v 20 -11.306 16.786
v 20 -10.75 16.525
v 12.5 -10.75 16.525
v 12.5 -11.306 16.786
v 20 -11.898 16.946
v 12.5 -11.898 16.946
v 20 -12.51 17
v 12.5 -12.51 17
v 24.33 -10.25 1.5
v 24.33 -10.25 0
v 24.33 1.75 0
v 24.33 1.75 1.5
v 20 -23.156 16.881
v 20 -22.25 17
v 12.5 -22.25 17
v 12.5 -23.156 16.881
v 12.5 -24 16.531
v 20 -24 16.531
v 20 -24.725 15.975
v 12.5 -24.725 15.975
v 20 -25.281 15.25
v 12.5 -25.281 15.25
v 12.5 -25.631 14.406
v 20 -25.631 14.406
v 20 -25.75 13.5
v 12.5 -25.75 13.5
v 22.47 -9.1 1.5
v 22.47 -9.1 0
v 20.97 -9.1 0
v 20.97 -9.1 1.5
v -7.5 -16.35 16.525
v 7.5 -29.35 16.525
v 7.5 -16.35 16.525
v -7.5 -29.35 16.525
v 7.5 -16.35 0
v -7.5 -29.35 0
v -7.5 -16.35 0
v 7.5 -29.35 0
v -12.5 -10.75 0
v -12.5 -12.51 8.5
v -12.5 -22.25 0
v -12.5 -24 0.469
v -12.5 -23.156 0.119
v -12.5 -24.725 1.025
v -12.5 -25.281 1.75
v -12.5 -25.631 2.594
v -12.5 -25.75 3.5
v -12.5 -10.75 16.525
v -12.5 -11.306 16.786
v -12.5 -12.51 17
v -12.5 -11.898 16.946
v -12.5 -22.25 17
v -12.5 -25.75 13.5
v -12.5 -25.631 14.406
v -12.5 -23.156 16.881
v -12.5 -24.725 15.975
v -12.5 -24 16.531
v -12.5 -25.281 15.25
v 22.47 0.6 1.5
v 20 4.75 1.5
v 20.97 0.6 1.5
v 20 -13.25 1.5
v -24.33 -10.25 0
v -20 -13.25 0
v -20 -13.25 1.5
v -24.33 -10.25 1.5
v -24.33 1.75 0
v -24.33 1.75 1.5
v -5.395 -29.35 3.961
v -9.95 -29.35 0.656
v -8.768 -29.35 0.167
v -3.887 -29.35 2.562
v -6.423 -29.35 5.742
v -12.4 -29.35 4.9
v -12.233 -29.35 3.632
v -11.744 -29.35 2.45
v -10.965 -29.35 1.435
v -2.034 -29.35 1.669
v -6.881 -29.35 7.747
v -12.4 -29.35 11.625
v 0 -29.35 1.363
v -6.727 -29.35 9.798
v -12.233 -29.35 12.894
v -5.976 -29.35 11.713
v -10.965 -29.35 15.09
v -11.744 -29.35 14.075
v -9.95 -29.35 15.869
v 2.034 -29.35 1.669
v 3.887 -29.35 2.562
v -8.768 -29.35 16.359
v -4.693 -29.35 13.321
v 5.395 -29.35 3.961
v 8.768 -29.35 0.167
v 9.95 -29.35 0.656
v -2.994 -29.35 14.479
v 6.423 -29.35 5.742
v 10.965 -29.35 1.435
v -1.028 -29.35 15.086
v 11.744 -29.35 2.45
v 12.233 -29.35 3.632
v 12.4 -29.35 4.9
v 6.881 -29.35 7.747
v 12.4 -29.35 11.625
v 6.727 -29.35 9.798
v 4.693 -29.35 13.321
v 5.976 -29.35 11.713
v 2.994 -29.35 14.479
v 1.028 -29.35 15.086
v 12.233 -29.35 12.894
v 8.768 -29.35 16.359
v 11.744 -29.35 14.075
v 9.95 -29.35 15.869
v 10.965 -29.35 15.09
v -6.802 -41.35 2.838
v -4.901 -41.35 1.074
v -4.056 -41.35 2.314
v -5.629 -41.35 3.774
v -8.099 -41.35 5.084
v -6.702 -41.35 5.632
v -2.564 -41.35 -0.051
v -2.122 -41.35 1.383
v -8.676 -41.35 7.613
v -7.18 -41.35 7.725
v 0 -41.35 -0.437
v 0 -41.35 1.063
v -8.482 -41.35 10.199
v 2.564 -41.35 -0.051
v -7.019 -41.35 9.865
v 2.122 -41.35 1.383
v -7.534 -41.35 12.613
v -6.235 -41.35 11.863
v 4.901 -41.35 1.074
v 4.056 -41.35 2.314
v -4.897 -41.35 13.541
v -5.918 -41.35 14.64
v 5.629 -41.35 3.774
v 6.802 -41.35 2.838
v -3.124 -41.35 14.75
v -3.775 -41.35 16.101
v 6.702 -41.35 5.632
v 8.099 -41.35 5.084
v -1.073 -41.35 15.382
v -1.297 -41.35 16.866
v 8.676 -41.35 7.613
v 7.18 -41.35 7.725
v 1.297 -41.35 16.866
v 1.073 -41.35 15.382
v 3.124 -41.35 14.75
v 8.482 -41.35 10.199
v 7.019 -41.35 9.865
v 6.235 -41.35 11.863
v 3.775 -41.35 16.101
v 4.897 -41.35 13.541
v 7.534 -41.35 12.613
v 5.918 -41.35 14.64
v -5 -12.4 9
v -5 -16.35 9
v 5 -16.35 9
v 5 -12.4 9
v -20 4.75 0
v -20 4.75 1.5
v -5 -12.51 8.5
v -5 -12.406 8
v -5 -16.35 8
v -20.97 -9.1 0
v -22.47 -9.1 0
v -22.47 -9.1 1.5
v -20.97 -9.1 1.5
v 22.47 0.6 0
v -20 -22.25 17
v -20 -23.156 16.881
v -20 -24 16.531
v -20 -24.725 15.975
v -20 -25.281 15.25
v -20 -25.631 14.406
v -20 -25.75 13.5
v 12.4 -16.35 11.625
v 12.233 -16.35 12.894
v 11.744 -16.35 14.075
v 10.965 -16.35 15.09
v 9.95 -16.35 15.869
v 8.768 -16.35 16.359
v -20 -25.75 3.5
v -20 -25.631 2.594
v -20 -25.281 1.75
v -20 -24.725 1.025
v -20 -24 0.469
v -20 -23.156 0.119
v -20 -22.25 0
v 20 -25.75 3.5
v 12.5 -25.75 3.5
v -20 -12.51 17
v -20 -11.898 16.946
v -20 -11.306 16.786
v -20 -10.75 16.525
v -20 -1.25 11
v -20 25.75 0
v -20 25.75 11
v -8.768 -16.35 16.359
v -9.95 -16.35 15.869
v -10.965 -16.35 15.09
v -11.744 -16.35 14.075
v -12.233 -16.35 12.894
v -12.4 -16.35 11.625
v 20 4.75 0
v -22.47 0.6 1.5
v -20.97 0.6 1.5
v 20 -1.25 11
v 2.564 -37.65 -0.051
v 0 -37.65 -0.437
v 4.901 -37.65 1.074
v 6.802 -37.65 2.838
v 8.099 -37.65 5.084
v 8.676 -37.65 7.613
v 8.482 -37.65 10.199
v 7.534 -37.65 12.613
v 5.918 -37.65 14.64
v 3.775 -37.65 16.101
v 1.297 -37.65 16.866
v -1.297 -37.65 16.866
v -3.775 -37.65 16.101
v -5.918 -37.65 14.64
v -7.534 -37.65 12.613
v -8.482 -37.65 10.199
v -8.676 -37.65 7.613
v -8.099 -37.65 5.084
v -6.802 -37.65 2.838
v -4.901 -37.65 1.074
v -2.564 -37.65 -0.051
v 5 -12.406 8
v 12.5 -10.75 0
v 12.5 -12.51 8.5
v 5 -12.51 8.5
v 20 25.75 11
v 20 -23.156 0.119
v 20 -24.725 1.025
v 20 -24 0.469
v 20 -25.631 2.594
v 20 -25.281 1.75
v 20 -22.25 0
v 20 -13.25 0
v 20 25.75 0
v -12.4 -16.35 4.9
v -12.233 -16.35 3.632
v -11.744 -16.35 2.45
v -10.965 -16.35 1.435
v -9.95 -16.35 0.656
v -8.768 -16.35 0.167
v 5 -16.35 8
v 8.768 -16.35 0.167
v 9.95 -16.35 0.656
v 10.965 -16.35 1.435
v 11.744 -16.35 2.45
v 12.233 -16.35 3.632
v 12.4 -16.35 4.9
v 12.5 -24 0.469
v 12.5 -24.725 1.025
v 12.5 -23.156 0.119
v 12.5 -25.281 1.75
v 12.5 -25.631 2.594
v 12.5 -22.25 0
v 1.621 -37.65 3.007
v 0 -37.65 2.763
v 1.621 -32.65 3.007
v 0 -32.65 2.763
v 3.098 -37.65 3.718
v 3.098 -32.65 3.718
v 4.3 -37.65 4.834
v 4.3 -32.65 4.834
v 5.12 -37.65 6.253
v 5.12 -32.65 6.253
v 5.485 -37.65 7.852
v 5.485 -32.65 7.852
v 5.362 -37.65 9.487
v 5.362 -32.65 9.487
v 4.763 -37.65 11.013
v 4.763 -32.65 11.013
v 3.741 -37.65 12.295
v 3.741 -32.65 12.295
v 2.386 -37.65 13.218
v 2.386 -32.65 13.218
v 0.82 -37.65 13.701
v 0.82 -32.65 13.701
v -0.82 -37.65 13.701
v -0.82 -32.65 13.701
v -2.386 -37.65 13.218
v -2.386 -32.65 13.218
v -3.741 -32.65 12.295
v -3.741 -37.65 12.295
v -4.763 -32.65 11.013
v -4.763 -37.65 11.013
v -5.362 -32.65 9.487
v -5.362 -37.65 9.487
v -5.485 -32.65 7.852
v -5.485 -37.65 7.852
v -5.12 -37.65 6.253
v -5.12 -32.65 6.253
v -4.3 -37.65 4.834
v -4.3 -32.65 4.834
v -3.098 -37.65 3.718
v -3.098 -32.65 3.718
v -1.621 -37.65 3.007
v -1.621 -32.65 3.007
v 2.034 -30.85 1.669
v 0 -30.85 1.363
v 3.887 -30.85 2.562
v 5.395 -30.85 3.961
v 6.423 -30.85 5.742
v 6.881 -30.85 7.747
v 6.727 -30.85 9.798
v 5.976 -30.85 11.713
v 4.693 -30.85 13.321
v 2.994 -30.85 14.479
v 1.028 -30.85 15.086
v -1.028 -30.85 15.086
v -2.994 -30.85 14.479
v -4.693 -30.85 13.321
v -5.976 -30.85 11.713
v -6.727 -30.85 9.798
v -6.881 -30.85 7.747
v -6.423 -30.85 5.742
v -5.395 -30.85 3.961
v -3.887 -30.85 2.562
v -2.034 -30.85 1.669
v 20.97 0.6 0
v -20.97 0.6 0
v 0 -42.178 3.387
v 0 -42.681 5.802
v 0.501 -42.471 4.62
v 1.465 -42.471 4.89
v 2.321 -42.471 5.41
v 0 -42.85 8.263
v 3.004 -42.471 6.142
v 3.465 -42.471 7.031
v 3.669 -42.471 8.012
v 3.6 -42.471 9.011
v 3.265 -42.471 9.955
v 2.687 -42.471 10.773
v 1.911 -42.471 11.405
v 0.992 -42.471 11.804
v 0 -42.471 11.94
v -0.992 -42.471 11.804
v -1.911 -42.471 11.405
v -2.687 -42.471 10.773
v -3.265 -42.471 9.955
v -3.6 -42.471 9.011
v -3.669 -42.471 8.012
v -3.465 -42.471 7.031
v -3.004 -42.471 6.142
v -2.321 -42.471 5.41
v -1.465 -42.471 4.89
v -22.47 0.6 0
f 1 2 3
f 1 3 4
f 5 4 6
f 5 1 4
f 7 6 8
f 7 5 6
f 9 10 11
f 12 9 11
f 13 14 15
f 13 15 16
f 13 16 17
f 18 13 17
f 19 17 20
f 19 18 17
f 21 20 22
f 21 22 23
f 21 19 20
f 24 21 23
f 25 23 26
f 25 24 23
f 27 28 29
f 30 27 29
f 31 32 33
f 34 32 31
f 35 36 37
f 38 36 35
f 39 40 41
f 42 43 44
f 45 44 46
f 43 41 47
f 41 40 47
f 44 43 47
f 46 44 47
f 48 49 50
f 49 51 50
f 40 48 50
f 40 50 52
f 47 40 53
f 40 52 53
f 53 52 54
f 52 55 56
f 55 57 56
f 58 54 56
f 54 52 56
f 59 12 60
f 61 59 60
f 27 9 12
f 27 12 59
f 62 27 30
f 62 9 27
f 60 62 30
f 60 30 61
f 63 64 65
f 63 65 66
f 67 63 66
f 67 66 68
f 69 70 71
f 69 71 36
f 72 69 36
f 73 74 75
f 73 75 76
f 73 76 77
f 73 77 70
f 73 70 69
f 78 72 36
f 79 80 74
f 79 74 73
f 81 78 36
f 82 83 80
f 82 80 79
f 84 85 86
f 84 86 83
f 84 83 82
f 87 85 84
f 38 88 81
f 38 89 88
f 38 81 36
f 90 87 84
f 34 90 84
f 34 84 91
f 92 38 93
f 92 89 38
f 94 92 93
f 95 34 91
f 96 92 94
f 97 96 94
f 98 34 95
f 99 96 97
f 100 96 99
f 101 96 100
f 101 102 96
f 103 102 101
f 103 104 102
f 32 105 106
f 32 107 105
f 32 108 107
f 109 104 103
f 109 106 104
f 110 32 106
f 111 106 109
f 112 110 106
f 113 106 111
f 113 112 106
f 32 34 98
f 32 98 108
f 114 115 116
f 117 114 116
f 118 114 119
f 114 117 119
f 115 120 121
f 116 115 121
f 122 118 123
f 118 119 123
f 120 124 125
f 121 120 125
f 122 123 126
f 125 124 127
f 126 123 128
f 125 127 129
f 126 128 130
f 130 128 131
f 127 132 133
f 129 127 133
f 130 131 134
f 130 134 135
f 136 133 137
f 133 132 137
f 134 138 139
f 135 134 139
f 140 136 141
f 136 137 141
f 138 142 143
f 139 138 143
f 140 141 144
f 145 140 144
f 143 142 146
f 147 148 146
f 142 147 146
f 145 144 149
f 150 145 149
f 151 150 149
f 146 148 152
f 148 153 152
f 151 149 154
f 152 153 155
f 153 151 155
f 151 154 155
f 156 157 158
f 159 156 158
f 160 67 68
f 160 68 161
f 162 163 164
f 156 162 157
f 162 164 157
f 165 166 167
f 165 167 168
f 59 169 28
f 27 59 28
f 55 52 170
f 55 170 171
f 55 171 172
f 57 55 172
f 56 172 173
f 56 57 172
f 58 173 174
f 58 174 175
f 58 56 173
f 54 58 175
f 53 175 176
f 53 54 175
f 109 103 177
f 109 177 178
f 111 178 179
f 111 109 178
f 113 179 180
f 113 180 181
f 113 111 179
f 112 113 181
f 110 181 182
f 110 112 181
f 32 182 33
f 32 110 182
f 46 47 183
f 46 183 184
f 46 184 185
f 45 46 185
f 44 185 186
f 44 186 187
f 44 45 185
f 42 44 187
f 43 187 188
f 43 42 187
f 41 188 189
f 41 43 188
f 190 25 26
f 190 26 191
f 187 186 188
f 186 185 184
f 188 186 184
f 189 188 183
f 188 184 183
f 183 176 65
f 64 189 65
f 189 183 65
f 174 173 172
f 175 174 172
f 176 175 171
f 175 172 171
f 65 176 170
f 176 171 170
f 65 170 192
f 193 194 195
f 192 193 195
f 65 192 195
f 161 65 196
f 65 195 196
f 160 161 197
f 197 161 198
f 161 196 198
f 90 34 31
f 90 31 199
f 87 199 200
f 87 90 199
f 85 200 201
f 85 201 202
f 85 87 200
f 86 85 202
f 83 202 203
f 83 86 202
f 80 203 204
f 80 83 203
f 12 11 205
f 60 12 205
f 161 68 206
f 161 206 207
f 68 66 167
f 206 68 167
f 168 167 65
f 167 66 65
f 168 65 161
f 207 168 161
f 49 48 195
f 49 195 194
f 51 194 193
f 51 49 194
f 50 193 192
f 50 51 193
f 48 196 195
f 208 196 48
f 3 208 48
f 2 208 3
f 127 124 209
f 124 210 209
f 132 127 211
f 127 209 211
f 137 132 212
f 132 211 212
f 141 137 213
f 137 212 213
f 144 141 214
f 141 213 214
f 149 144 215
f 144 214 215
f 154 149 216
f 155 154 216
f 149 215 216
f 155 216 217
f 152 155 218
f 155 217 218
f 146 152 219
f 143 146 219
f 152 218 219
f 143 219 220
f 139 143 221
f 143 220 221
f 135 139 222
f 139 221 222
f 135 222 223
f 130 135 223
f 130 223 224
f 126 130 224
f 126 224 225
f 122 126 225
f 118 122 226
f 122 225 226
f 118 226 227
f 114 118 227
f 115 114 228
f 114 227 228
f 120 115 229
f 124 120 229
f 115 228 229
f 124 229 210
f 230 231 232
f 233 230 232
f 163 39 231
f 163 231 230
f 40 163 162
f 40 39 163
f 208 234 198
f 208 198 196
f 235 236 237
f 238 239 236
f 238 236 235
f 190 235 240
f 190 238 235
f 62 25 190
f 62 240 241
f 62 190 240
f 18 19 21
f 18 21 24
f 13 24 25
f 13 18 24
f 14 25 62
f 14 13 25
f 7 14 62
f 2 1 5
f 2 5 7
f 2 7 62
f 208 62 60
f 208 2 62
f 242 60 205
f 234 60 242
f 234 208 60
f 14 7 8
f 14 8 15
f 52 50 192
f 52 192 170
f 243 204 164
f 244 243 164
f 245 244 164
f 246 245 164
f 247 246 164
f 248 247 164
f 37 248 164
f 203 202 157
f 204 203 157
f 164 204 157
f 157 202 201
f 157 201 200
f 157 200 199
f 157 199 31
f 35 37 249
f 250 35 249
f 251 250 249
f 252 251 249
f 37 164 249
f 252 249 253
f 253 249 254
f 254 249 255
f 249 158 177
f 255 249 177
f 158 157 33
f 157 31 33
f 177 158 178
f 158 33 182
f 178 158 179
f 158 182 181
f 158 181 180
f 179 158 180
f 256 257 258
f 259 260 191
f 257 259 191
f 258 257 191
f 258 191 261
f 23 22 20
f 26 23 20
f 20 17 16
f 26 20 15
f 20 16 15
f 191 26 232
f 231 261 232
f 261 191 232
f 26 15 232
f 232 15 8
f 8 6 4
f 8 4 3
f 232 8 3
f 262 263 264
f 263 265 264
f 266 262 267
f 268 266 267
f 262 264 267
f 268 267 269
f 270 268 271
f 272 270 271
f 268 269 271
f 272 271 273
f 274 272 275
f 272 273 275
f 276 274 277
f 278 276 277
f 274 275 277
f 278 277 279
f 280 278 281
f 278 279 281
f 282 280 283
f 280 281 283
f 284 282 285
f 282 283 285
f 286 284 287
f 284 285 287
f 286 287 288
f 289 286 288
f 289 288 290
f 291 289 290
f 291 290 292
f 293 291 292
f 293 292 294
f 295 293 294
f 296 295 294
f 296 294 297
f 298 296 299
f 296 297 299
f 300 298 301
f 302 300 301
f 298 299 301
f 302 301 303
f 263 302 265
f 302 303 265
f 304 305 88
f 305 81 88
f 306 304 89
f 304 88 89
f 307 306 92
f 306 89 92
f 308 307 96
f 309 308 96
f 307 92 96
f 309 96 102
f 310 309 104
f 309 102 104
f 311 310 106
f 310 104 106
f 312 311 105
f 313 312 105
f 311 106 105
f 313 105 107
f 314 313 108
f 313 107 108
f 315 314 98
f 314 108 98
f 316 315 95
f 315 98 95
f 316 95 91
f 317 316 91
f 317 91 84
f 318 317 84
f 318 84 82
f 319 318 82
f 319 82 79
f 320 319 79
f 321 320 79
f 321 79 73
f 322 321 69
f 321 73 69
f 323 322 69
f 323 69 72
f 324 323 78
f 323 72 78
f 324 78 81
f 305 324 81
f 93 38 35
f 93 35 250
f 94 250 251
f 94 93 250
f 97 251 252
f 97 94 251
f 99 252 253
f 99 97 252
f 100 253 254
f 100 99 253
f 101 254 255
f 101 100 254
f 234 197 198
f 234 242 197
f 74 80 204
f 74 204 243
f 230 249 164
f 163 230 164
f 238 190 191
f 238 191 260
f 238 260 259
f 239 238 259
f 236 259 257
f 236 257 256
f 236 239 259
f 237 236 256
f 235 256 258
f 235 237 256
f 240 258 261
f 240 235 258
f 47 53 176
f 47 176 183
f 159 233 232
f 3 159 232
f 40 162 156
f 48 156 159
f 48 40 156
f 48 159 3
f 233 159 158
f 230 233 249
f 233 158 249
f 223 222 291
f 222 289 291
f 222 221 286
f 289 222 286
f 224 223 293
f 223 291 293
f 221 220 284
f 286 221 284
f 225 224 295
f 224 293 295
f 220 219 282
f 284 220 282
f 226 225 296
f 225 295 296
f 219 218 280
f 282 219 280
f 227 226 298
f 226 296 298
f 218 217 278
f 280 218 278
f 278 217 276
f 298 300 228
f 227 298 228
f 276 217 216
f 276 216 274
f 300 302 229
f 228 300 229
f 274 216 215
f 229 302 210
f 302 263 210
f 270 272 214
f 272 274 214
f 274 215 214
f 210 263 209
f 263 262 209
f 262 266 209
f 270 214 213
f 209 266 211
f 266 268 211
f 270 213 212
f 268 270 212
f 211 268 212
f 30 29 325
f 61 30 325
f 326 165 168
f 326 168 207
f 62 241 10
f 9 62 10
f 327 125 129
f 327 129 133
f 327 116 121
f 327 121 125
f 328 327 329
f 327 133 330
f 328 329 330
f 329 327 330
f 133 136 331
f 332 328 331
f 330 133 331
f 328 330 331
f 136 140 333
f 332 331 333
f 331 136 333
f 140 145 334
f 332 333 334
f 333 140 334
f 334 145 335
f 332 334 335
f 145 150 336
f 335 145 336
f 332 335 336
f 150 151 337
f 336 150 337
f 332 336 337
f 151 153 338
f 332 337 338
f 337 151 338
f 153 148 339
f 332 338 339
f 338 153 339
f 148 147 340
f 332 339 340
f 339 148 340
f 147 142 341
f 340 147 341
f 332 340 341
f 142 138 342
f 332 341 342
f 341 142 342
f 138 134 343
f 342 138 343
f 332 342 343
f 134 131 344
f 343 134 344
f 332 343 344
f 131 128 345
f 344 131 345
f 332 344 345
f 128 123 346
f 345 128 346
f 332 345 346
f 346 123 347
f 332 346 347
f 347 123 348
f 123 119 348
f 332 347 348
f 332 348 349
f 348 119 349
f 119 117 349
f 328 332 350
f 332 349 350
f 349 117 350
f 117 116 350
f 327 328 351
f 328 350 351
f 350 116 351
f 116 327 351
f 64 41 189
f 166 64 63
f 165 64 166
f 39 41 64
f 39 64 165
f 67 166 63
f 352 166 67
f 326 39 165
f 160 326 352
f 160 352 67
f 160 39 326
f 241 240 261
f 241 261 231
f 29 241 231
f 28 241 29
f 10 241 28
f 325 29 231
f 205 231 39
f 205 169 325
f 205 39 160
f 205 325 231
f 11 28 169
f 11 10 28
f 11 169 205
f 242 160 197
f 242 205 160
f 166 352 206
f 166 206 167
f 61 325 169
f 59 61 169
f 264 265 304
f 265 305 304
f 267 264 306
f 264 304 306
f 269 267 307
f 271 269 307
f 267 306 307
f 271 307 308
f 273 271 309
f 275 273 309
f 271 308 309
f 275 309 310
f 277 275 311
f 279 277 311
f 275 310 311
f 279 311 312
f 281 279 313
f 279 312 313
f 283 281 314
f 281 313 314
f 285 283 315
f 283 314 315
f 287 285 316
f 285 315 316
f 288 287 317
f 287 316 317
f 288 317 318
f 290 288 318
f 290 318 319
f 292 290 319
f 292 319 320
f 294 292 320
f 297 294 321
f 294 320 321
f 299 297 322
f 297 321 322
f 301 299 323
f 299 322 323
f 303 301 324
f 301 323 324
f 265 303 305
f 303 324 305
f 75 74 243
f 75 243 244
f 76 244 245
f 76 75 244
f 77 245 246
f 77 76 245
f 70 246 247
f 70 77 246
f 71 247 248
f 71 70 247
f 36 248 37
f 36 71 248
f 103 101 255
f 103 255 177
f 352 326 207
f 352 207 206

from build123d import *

# Parameters (mm, degrees)
F1_DEPTH  = 20
F3_DEPTH  = 17
F5_DEPTH  = 25
F7_DEPTH  = 1.5
F11_DEPTH = 13
F13_DEPTH = 42.1


with BuildPart() as f1:
    # F0 (on Right) → F1 (new body, symmetric)
    with BuildSketch(Plane.YZ):
        with BuildLine():
            Line((25.75, 0), (25.75, 11))
            Line((25.75, 11), (-1.25, 11))
            Line((-1.25, 11), (-10.75, 16.5254688627))
            ThreePointArc((-10.75, 16.5254688627), (-11.5984192745, 16.8792855028), (-12.5096983153, 17))
            Line((-12.5096983153, 17), (-22.25, 17))
            ThreePointArc((-22.25, 17), (-24.7248737342, 15.9748737342), (-25.75, 13.5))
            Line((-25.75, 13.5), (-25.75, 3.5))
            ThreePointArc((-25.75, 3.5), (-24.7248737342, 1.0251262658), (-22.25, 0))
            Line((-22.25, 0), (25.75, 0))
        make_face()
    extrude(amount=F1_DEPTH, both=True)

    # F2 (on face) → F3 (cut, through all)
    with BuildSketch(Plane.XY.offset(17)):
        Polygon((0, -12.5096983153), (-12.5, -12.5096983153), (-12.5, -25.75), (0, -25.75), (12.5, -25.75), (12.5, -12.5096983153), align=None)
    extrude(amount=-F3_DEPTH, mode=Mode.SUBTRACT)

    # F4 (on face) → F5 (cut, through all)
    with BuildSketch(Plane.YZ.offset(-12.5)):
        Polygon((-10.75, 0), (-12.5096983153, 8.5), (-12.5096983153, 0), align=None)
        with BuildLine():
            Line((-12.5096983153, 8.5), (-10.75, 16.5254688627))
            ThreePointArc((-10.75, 16.5254688627), (-11.5984192745, 16.8792855028), (-12.5096983153, 17))
            Line((-12.5096983153, 17), (-12.5096983153, 8.5))
        make_face()
    extrude(amount=F5_DEPTH, mode=Mode.SUBTRACT)

    # F6 (on face) → F7 (join)
    with BuildSketch(Plane(origin=(0, 0, 0), x_dir=(1, 0, 0), z_dir=(0, 0, -1))):
        Polygon((-24.33, -1.75), (-20, -4.75), (-20, 13.25), (-24.33, 10.25), (-24.33, 4.25), align=None)
        Polygon((-22.47, 4.25), (-22.47, 9.1), (-20.97, 9.1), (-20.97, 4.25), (-20.97, -0.6), (-22.47, -0.6), align=None, mode=Mode.SUBTRACT)
    extrude(amount=-F7_DEPTH)

    # F8: F1 across plane


with BuildPart() as f1_1:
    add(f1.part)
    add(f1.part.mirror(Plane.YZ))



with BuildPart() as f11:
    # F10 (on offset) → F11 (new body)
    with BuildSketch(Plane.XZ.offset(29.35)):
        with BuildLine():
            Line((0, 16.5254688627), (-7.5, 16.5254688627))
            ThreePointArc((-7.5, 16.5254688627), (-10.9648232278, 15.0902920905), (-12.4, 11.6254688627))
            Line((-12.4, 11.6254688627), (-12.4, 4.9))
            ThreePointArc((-12.4, 4.9), (-10.9648232278, 1.4351767722), (-7.5, 0))
            Line((-7.5, 0), (0, 0))
            Line((0, 0), (7.5, 0))
            ThreePointArc((7.5, 0), (10.9648232278, 1.4351767722), (12.4, 4.9))
            Line((12.4, 4.9), (12.4, 11.6254688627))
            ThreePointArc((12.4, 11.6254688627), (10.9648232278, 15.0902920905), (7.5, 16.5254688627))
            Line((7.5, 16.5254688627), (0, 16.5254688627))
        make_face()
    extrude(amount=-F11_DEPTH)


with BuildPart() as f1_2:
    add(f1_1.part)

    add(f11.part)  # F13 merges F11
    # F12 (on face) → F13 (join, through all)
    with BuildSketch(Plane(origin=(0, -16.35, 0), x_dir=(-1, 0, 0), z_dir=(0, 1, 0))):
        Polygon((0, 8.9999999979), (-5, 8.9999999979), (-5, 8.4999999979), (-5, 7.9999999979), (0, 7.9999999979), (5, 7.9999999979), (5, 8.4999999979), (5, 8.9999999979), align=None)
    extrude(amount=F13_DEPTH)

    # F14 (on Right) → F15 (revolve)
    with BuildSketch(Plane.YZ):
        with BuildLine():
            Line((-29.35, 4.9), (-29.35, 8.2627344313))
            Line((-29.35, 8.2627344313), (-41.35, 8.2627344313))
            Line((-41.35, 8.2627344313), (-42.85, 8.2627344313))
            ThreePointArc((-42.85, 8.2627344313), (-42.4710169679, 4.5854392297), (-41.35, 1.0627344313))
            Line((-41.35, 1.0627344313), (-41.35, -0.4372655687))
            Line((-41.35, -0.4372655687), (-37.65, -0.4372655687))
            Line((-37.65, -0.4372655687), (-37.65, 2.7627344313))
            Line((-37.65, 2.7627344313), (-32.65, 2.7627344313))
            Line((-32.65, 2.7627344313), (-30.85, 1.3627344313))
            Line((-30.85, 1.3627344313), (-29.35, 1.3627344313))
            Line((-29.35, 1.3627344313), (-29.35, 4.9))
        make_face()
    revolve(axis=Axis((0, -35.35, 8.2627344313), (0, -1, 0)))


solid = f1_2.part
